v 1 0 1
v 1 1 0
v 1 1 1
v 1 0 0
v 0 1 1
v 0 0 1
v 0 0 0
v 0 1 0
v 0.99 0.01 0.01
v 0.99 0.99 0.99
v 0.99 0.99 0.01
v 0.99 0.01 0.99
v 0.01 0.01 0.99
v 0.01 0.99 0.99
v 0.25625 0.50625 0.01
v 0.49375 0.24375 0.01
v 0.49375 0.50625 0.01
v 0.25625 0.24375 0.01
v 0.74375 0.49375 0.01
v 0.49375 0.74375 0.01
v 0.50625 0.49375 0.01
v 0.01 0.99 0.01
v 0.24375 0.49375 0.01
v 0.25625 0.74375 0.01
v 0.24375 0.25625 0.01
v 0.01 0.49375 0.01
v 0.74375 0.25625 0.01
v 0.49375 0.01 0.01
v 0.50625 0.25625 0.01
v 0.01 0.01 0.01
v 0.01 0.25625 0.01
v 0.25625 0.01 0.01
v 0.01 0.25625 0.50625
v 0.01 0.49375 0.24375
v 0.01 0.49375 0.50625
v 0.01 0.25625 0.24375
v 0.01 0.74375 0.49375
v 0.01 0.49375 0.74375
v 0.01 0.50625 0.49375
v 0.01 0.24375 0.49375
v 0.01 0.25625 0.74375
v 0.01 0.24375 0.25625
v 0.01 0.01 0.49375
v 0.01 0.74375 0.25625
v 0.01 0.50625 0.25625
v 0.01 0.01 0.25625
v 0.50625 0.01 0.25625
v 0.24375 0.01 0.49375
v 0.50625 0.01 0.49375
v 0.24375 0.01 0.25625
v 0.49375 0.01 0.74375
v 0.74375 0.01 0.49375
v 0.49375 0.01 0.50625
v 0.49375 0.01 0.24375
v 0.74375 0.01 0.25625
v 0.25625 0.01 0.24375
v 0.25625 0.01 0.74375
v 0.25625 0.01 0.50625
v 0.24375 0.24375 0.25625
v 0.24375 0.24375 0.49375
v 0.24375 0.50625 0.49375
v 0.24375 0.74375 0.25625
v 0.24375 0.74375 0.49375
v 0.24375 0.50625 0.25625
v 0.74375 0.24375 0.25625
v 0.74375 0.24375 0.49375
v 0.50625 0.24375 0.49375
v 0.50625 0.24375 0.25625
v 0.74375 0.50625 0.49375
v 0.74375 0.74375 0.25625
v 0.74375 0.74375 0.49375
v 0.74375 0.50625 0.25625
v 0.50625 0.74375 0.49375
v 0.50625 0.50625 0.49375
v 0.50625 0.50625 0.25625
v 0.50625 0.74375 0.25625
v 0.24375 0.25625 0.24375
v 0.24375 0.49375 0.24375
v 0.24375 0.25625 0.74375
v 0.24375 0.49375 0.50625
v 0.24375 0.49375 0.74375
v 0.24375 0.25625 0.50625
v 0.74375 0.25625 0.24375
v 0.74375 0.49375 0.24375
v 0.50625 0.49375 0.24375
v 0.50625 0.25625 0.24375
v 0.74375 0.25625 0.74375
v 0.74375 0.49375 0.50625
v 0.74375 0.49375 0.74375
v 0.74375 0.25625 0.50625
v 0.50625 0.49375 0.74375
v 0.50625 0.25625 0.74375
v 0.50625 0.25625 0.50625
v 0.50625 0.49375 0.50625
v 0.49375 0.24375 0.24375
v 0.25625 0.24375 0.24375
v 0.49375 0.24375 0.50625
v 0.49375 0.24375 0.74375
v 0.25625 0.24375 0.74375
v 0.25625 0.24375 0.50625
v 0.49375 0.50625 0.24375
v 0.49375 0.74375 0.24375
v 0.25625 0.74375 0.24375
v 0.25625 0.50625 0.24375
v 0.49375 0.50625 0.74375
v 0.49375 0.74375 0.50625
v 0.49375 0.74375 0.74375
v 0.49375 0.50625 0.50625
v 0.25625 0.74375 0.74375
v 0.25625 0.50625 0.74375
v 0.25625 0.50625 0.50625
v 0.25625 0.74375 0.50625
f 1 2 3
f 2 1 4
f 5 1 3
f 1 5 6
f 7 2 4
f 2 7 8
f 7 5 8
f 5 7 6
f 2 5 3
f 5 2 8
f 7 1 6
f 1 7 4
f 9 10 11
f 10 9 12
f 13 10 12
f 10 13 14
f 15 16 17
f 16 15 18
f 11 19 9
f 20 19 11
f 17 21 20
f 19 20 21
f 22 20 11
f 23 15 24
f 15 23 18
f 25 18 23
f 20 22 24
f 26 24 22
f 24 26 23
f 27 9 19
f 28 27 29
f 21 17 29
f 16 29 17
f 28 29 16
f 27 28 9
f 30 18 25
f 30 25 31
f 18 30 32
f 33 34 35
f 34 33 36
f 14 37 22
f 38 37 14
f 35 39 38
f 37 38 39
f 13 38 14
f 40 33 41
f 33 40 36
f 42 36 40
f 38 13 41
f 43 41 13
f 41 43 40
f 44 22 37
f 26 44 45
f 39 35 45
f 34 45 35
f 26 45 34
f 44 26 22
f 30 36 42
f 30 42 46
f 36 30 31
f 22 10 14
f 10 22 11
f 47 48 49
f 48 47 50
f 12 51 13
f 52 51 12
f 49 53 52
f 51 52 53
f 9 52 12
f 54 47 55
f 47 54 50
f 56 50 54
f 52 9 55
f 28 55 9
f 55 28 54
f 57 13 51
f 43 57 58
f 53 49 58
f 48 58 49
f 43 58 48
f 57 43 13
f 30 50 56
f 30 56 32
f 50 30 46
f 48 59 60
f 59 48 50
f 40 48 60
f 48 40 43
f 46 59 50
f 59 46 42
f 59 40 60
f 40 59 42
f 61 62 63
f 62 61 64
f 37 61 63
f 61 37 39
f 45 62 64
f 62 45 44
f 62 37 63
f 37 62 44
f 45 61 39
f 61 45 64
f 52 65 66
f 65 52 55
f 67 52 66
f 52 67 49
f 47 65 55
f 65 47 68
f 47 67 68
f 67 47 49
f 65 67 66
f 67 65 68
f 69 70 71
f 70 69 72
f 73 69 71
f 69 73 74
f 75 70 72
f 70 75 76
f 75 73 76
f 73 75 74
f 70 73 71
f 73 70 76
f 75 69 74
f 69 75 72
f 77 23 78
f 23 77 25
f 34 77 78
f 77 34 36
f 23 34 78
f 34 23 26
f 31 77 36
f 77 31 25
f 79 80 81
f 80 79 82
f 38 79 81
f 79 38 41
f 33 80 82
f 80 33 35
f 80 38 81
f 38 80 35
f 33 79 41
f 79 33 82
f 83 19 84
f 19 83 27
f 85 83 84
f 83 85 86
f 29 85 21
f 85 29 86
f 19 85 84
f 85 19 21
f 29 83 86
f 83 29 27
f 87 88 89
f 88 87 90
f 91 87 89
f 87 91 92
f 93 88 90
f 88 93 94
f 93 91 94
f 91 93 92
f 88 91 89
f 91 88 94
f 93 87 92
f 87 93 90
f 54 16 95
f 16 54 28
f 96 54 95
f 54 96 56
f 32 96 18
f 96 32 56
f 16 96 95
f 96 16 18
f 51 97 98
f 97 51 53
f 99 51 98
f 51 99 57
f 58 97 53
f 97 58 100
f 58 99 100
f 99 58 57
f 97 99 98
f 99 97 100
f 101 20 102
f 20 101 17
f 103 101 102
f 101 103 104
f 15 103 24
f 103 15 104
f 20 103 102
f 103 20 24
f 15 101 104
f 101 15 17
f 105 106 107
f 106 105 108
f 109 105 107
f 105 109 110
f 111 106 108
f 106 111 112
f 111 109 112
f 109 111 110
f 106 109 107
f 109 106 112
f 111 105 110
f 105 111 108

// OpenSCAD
translate([0.125, 0.125, 0.375]) color([0.7585348851851137, 0.4108709214167564, 0.09366372103111364]) cube([0.2375, 0.2375, 0.2375], center=true);
translate([0.125, 0.625, 0.375]) color([0.830155566987344, 0.18094424609150728, 0.9176227521922086]) cube([0.2375, 0.2375, 0.2375], center=true);
translate([0.625, 0.125, 0.375]) color([0.9529501353459945, 0.4257794459656884, 0.031192825884839515]) cube([0.2375, 0.2375, 0.2375], center=true);
translate([0.625, 0.625, 0.375]) color([0.49224294565020243, 0.28179459730619727, 0.7342665608910384]) cube([0.2375, 0.2375, 0.2375], center=true);
translate([0.125, 0.375, 0.125]) color([0.7626727691516175, 0.8899742189354138, 0.5486404035697269]) cube([0.2375, 0.2375, 0.2375], center=true);
translate([0.125, 0.375, 0.625]) color([0.7671805076483915, 0.6121861737886979, 0.40435887819181315]) cube([0.2375, 0.2375, 0.2375], center=true);
translate([0.625, 0.375, 0.125]) color([0.27641070625592756, 0.32508662163924684, 0.2793020411138708]) cube([0.2375, 0.2375, 0.2375], center=true);
translate([0.625, 0.375, 0.625]) color([0.3036325261711321, 0.12516363598825098, 0.8706740879432517]) cube([0.2375, 0.2375, 0.2375], center=true);
translate([0.375, 0.125, 0.125]) color([0.9778055059540787, 0.9380432467905317, 0.4875084288926418]) cube([0.2375, 0.2375, 0.2375], center=true);
translate([0.375, 0.125, 0.625]) color([0.491337367161355, 0.815223965662181, 0.2850245734476238]) cube([0.2375, 0.2375, 0.2375], center=true);
translate([0.375, 0.625, 0.125]) color([0.6704048963284681, 0.8749445737887569, 0.9225621091062656]) cube([0.2375, 0.2375, 0.2375], center=true);
translate([0.375, 0.625, 0.625]) color([0.32650592014424495, 0.9267679289247295, 0.9392976353444438]) cube([0.2375, 0.2375, 0.2375], center=true);
color([0.3,0.3,0.3,0.3]) difference() { cube([1,1,1]); translate([0.01,0.01,0.01]) cube([0.98,0.98,0.98]); }
